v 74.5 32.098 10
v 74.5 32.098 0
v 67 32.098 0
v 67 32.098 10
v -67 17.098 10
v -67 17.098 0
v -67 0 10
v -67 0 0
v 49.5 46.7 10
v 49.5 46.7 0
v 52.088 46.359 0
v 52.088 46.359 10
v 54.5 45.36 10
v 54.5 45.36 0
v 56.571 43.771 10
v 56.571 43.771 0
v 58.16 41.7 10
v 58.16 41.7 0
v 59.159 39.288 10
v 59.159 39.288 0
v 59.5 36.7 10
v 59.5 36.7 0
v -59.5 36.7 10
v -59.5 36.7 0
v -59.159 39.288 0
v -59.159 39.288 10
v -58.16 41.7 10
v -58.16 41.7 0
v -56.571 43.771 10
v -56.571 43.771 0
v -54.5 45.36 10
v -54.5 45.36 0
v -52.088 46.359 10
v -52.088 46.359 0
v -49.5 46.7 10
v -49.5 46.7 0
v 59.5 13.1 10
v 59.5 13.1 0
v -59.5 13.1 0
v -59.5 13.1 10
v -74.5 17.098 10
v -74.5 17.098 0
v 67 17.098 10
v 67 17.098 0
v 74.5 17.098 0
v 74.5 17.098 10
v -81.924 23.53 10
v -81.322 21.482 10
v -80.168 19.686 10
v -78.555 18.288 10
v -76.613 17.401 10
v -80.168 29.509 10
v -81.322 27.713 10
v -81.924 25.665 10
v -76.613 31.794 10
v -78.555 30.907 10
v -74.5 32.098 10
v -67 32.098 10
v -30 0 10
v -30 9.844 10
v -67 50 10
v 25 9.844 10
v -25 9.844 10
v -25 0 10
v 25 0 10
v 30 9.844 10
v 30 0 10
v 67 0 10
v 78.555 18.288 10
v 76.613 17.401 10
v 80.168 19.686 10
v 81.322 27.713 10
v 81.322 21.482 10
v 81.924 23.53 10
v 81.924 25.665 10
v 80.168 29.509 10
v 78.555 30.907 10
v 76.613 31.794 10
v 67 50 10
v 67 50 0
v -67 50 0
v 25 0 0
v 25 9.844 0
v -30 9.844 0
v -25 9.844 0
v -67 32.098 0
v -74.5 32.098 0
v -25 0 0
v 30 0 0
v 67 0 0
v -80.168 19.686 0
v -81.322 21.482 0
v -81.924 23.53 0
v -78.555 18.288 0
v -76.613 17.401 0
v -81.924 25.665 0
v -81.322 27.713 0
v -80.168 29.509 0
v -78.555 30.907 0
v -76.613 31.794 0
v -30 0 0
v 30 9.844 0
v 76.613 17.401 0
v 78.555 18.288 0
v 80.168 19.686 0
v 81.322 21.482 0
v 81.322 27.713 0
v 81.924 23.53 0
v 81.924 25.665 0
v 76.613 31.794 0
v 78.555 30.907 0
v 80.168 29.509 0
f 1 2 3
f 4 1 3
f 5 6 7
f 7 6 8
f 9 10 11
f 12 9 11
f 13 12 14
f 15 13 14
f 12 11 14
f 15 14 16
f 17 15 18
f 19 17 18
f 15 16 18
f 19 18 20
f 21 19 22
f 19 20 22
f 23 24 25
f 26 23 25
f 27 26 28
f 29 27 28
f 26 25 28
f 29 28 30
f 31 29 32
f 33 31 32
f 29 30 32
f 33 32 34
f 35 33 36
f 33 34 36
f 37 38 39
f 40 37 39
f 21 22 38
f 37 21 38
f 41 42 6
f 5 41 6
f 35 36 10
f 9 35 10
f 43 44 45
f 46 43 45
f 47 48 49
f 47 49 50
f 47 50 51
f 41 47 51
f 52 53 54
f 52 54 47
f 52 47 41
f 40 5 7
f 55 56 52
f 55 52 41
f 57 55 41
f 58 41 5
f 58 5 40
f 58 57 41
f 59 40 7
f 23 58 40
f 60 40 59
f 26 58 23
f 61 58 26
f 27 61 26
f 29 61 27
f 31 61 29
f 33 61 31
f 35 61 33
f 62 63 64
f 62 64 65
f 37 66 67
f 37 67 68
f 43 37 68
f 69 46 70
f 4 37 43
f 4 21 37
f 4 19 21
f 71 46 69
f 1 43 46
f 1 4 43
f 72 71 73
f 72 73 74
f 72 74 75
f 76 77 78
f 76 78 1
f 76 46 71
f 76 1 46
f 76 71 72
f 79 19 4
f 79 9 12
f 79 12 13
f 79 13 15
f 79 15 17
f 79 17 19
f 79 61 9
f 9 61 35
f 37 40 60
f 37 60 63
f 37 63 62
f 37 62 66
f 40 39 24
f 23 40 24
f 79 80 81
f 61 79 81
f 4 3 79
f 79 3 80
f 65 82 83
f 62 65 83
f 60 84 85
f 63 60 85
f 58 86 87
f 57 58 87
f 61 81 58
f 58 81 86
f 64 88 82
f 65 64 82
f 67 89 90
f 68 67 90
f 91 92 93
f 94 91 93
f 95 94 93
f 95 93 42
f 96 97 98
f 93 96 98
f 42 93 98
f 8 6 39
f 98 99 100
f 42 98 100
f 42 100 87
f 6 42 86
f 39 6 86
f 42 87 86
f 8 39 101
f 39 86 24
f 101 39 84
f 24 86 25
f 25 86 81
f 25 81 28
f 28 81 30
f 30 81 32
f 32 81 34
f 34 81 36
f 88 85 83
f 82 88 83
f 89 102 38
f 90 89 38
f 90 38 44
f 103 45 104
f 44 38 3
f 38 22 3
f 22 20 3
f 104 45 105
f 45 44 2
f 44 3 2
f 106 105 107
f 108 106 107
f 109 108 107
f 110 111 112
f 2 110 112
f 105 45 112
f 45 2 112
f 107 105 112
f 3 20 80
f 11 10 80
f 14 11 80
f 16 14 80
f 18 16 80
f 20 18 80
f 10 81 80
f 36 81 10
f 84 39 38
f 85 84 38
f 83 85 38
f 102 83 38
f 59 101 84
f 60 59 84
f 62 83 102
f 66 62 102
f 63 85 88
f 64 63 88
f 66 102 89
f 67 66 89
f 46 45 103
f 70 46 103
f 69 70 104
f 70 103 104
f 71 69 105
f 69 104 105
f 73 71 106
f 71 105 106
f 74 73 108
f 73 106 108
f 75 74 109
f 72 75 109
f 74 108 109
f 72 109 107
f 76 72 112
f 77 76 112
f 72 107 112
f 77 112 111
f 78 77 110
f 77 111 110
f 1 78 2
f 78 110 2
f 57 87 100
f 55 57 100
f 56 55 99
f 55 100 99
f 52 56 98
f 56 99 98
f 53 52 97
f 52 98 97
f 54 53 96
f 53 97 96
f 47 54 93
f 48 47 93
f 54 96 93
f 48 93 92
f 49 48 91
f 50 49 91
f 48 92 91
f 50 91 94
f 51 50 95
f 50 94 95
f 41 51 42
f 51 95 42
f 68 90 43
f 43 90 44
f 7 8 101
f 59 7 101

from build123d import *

# Parameters (mm, degrees)
SALIENTE_EXTRUIR1_DEPTH = 10


with BuildPart() as part:
    # Croquis1 → Saliente-Extruir1 (new body)
    with BuildSketch(Plane.XY):
        with BuildLine():
            Line((-25, 9.844348503), (-25, 0))
            Line((-25, 0), (25, 0))
            Line((25, 0), (25, 9.844348503))
            Line((25, 9.844348503), (30, 9.844348503))
            Line((30, 9.844348503), (30, 0))
            Line((30, 0), (67, 0))
            Line((67, 0), (67, 17.097567982))
            Line((67, 17.097567982), (74.5, 17.097567982))
            ThreePointArc((74.5, 17.097567982), (82, 24.597567982), (74.5, 32.097567982))
            Line((74.5, 32.097567982), (67, 32.097567982))
            Line((67, 32.097567982), (67, 50))
            Line((67, 50), (-67, 50))
            Line((-67, 50), (-67, 32.097567982))
            Line((-67, 32.097567982), (-74.5, 32.097567982))
            ThreePointArc((-74.5, 32.097567982), (-82, 24.597567982), (-74.5, 17.097567982))
            Line((-74.5, 17.097567982), (-67, 17.097567982))
            Line((-67, 17.097567982), (-67, 0))
            Line((-67, 0), (-30, 0))
            Line((-30, 0), (-30, 9.844348503))
            Line((-30, 9.844348503), (-25, 9.844348503))
        make_face()
        with BuildLine():
            Line((59.5, 13.1), (-59.5, 13.1))
            Line((-59.5, 13.1), (-59.5, 17.097567982))
            Line((-59.5, 17.097567982), (-59.5, 32.097567982))
            Line((-59.5, 32.097567982), (-59.5, 36.7))
            ThreePointArc((-59.5, 36.7), (-56.571067812, 43.771067812), (-49.5, 46.7))
            Line((-49.5, 46.7), (44.1, 46.7))
            Line((44.1, 46.7), (49.5, 46.7))
            ThreePointArc((49.5, 46.7), (56.571067812, 43.771067812), (59.5, 36.7))
            Line((59.5, 36.7), (59.5, 13.1))
        make_face(mode=Mode.SUBTRACT)
    extrude(amount=SALIENTE_EXTRUIR1_DEPTH)


solid = part.part
